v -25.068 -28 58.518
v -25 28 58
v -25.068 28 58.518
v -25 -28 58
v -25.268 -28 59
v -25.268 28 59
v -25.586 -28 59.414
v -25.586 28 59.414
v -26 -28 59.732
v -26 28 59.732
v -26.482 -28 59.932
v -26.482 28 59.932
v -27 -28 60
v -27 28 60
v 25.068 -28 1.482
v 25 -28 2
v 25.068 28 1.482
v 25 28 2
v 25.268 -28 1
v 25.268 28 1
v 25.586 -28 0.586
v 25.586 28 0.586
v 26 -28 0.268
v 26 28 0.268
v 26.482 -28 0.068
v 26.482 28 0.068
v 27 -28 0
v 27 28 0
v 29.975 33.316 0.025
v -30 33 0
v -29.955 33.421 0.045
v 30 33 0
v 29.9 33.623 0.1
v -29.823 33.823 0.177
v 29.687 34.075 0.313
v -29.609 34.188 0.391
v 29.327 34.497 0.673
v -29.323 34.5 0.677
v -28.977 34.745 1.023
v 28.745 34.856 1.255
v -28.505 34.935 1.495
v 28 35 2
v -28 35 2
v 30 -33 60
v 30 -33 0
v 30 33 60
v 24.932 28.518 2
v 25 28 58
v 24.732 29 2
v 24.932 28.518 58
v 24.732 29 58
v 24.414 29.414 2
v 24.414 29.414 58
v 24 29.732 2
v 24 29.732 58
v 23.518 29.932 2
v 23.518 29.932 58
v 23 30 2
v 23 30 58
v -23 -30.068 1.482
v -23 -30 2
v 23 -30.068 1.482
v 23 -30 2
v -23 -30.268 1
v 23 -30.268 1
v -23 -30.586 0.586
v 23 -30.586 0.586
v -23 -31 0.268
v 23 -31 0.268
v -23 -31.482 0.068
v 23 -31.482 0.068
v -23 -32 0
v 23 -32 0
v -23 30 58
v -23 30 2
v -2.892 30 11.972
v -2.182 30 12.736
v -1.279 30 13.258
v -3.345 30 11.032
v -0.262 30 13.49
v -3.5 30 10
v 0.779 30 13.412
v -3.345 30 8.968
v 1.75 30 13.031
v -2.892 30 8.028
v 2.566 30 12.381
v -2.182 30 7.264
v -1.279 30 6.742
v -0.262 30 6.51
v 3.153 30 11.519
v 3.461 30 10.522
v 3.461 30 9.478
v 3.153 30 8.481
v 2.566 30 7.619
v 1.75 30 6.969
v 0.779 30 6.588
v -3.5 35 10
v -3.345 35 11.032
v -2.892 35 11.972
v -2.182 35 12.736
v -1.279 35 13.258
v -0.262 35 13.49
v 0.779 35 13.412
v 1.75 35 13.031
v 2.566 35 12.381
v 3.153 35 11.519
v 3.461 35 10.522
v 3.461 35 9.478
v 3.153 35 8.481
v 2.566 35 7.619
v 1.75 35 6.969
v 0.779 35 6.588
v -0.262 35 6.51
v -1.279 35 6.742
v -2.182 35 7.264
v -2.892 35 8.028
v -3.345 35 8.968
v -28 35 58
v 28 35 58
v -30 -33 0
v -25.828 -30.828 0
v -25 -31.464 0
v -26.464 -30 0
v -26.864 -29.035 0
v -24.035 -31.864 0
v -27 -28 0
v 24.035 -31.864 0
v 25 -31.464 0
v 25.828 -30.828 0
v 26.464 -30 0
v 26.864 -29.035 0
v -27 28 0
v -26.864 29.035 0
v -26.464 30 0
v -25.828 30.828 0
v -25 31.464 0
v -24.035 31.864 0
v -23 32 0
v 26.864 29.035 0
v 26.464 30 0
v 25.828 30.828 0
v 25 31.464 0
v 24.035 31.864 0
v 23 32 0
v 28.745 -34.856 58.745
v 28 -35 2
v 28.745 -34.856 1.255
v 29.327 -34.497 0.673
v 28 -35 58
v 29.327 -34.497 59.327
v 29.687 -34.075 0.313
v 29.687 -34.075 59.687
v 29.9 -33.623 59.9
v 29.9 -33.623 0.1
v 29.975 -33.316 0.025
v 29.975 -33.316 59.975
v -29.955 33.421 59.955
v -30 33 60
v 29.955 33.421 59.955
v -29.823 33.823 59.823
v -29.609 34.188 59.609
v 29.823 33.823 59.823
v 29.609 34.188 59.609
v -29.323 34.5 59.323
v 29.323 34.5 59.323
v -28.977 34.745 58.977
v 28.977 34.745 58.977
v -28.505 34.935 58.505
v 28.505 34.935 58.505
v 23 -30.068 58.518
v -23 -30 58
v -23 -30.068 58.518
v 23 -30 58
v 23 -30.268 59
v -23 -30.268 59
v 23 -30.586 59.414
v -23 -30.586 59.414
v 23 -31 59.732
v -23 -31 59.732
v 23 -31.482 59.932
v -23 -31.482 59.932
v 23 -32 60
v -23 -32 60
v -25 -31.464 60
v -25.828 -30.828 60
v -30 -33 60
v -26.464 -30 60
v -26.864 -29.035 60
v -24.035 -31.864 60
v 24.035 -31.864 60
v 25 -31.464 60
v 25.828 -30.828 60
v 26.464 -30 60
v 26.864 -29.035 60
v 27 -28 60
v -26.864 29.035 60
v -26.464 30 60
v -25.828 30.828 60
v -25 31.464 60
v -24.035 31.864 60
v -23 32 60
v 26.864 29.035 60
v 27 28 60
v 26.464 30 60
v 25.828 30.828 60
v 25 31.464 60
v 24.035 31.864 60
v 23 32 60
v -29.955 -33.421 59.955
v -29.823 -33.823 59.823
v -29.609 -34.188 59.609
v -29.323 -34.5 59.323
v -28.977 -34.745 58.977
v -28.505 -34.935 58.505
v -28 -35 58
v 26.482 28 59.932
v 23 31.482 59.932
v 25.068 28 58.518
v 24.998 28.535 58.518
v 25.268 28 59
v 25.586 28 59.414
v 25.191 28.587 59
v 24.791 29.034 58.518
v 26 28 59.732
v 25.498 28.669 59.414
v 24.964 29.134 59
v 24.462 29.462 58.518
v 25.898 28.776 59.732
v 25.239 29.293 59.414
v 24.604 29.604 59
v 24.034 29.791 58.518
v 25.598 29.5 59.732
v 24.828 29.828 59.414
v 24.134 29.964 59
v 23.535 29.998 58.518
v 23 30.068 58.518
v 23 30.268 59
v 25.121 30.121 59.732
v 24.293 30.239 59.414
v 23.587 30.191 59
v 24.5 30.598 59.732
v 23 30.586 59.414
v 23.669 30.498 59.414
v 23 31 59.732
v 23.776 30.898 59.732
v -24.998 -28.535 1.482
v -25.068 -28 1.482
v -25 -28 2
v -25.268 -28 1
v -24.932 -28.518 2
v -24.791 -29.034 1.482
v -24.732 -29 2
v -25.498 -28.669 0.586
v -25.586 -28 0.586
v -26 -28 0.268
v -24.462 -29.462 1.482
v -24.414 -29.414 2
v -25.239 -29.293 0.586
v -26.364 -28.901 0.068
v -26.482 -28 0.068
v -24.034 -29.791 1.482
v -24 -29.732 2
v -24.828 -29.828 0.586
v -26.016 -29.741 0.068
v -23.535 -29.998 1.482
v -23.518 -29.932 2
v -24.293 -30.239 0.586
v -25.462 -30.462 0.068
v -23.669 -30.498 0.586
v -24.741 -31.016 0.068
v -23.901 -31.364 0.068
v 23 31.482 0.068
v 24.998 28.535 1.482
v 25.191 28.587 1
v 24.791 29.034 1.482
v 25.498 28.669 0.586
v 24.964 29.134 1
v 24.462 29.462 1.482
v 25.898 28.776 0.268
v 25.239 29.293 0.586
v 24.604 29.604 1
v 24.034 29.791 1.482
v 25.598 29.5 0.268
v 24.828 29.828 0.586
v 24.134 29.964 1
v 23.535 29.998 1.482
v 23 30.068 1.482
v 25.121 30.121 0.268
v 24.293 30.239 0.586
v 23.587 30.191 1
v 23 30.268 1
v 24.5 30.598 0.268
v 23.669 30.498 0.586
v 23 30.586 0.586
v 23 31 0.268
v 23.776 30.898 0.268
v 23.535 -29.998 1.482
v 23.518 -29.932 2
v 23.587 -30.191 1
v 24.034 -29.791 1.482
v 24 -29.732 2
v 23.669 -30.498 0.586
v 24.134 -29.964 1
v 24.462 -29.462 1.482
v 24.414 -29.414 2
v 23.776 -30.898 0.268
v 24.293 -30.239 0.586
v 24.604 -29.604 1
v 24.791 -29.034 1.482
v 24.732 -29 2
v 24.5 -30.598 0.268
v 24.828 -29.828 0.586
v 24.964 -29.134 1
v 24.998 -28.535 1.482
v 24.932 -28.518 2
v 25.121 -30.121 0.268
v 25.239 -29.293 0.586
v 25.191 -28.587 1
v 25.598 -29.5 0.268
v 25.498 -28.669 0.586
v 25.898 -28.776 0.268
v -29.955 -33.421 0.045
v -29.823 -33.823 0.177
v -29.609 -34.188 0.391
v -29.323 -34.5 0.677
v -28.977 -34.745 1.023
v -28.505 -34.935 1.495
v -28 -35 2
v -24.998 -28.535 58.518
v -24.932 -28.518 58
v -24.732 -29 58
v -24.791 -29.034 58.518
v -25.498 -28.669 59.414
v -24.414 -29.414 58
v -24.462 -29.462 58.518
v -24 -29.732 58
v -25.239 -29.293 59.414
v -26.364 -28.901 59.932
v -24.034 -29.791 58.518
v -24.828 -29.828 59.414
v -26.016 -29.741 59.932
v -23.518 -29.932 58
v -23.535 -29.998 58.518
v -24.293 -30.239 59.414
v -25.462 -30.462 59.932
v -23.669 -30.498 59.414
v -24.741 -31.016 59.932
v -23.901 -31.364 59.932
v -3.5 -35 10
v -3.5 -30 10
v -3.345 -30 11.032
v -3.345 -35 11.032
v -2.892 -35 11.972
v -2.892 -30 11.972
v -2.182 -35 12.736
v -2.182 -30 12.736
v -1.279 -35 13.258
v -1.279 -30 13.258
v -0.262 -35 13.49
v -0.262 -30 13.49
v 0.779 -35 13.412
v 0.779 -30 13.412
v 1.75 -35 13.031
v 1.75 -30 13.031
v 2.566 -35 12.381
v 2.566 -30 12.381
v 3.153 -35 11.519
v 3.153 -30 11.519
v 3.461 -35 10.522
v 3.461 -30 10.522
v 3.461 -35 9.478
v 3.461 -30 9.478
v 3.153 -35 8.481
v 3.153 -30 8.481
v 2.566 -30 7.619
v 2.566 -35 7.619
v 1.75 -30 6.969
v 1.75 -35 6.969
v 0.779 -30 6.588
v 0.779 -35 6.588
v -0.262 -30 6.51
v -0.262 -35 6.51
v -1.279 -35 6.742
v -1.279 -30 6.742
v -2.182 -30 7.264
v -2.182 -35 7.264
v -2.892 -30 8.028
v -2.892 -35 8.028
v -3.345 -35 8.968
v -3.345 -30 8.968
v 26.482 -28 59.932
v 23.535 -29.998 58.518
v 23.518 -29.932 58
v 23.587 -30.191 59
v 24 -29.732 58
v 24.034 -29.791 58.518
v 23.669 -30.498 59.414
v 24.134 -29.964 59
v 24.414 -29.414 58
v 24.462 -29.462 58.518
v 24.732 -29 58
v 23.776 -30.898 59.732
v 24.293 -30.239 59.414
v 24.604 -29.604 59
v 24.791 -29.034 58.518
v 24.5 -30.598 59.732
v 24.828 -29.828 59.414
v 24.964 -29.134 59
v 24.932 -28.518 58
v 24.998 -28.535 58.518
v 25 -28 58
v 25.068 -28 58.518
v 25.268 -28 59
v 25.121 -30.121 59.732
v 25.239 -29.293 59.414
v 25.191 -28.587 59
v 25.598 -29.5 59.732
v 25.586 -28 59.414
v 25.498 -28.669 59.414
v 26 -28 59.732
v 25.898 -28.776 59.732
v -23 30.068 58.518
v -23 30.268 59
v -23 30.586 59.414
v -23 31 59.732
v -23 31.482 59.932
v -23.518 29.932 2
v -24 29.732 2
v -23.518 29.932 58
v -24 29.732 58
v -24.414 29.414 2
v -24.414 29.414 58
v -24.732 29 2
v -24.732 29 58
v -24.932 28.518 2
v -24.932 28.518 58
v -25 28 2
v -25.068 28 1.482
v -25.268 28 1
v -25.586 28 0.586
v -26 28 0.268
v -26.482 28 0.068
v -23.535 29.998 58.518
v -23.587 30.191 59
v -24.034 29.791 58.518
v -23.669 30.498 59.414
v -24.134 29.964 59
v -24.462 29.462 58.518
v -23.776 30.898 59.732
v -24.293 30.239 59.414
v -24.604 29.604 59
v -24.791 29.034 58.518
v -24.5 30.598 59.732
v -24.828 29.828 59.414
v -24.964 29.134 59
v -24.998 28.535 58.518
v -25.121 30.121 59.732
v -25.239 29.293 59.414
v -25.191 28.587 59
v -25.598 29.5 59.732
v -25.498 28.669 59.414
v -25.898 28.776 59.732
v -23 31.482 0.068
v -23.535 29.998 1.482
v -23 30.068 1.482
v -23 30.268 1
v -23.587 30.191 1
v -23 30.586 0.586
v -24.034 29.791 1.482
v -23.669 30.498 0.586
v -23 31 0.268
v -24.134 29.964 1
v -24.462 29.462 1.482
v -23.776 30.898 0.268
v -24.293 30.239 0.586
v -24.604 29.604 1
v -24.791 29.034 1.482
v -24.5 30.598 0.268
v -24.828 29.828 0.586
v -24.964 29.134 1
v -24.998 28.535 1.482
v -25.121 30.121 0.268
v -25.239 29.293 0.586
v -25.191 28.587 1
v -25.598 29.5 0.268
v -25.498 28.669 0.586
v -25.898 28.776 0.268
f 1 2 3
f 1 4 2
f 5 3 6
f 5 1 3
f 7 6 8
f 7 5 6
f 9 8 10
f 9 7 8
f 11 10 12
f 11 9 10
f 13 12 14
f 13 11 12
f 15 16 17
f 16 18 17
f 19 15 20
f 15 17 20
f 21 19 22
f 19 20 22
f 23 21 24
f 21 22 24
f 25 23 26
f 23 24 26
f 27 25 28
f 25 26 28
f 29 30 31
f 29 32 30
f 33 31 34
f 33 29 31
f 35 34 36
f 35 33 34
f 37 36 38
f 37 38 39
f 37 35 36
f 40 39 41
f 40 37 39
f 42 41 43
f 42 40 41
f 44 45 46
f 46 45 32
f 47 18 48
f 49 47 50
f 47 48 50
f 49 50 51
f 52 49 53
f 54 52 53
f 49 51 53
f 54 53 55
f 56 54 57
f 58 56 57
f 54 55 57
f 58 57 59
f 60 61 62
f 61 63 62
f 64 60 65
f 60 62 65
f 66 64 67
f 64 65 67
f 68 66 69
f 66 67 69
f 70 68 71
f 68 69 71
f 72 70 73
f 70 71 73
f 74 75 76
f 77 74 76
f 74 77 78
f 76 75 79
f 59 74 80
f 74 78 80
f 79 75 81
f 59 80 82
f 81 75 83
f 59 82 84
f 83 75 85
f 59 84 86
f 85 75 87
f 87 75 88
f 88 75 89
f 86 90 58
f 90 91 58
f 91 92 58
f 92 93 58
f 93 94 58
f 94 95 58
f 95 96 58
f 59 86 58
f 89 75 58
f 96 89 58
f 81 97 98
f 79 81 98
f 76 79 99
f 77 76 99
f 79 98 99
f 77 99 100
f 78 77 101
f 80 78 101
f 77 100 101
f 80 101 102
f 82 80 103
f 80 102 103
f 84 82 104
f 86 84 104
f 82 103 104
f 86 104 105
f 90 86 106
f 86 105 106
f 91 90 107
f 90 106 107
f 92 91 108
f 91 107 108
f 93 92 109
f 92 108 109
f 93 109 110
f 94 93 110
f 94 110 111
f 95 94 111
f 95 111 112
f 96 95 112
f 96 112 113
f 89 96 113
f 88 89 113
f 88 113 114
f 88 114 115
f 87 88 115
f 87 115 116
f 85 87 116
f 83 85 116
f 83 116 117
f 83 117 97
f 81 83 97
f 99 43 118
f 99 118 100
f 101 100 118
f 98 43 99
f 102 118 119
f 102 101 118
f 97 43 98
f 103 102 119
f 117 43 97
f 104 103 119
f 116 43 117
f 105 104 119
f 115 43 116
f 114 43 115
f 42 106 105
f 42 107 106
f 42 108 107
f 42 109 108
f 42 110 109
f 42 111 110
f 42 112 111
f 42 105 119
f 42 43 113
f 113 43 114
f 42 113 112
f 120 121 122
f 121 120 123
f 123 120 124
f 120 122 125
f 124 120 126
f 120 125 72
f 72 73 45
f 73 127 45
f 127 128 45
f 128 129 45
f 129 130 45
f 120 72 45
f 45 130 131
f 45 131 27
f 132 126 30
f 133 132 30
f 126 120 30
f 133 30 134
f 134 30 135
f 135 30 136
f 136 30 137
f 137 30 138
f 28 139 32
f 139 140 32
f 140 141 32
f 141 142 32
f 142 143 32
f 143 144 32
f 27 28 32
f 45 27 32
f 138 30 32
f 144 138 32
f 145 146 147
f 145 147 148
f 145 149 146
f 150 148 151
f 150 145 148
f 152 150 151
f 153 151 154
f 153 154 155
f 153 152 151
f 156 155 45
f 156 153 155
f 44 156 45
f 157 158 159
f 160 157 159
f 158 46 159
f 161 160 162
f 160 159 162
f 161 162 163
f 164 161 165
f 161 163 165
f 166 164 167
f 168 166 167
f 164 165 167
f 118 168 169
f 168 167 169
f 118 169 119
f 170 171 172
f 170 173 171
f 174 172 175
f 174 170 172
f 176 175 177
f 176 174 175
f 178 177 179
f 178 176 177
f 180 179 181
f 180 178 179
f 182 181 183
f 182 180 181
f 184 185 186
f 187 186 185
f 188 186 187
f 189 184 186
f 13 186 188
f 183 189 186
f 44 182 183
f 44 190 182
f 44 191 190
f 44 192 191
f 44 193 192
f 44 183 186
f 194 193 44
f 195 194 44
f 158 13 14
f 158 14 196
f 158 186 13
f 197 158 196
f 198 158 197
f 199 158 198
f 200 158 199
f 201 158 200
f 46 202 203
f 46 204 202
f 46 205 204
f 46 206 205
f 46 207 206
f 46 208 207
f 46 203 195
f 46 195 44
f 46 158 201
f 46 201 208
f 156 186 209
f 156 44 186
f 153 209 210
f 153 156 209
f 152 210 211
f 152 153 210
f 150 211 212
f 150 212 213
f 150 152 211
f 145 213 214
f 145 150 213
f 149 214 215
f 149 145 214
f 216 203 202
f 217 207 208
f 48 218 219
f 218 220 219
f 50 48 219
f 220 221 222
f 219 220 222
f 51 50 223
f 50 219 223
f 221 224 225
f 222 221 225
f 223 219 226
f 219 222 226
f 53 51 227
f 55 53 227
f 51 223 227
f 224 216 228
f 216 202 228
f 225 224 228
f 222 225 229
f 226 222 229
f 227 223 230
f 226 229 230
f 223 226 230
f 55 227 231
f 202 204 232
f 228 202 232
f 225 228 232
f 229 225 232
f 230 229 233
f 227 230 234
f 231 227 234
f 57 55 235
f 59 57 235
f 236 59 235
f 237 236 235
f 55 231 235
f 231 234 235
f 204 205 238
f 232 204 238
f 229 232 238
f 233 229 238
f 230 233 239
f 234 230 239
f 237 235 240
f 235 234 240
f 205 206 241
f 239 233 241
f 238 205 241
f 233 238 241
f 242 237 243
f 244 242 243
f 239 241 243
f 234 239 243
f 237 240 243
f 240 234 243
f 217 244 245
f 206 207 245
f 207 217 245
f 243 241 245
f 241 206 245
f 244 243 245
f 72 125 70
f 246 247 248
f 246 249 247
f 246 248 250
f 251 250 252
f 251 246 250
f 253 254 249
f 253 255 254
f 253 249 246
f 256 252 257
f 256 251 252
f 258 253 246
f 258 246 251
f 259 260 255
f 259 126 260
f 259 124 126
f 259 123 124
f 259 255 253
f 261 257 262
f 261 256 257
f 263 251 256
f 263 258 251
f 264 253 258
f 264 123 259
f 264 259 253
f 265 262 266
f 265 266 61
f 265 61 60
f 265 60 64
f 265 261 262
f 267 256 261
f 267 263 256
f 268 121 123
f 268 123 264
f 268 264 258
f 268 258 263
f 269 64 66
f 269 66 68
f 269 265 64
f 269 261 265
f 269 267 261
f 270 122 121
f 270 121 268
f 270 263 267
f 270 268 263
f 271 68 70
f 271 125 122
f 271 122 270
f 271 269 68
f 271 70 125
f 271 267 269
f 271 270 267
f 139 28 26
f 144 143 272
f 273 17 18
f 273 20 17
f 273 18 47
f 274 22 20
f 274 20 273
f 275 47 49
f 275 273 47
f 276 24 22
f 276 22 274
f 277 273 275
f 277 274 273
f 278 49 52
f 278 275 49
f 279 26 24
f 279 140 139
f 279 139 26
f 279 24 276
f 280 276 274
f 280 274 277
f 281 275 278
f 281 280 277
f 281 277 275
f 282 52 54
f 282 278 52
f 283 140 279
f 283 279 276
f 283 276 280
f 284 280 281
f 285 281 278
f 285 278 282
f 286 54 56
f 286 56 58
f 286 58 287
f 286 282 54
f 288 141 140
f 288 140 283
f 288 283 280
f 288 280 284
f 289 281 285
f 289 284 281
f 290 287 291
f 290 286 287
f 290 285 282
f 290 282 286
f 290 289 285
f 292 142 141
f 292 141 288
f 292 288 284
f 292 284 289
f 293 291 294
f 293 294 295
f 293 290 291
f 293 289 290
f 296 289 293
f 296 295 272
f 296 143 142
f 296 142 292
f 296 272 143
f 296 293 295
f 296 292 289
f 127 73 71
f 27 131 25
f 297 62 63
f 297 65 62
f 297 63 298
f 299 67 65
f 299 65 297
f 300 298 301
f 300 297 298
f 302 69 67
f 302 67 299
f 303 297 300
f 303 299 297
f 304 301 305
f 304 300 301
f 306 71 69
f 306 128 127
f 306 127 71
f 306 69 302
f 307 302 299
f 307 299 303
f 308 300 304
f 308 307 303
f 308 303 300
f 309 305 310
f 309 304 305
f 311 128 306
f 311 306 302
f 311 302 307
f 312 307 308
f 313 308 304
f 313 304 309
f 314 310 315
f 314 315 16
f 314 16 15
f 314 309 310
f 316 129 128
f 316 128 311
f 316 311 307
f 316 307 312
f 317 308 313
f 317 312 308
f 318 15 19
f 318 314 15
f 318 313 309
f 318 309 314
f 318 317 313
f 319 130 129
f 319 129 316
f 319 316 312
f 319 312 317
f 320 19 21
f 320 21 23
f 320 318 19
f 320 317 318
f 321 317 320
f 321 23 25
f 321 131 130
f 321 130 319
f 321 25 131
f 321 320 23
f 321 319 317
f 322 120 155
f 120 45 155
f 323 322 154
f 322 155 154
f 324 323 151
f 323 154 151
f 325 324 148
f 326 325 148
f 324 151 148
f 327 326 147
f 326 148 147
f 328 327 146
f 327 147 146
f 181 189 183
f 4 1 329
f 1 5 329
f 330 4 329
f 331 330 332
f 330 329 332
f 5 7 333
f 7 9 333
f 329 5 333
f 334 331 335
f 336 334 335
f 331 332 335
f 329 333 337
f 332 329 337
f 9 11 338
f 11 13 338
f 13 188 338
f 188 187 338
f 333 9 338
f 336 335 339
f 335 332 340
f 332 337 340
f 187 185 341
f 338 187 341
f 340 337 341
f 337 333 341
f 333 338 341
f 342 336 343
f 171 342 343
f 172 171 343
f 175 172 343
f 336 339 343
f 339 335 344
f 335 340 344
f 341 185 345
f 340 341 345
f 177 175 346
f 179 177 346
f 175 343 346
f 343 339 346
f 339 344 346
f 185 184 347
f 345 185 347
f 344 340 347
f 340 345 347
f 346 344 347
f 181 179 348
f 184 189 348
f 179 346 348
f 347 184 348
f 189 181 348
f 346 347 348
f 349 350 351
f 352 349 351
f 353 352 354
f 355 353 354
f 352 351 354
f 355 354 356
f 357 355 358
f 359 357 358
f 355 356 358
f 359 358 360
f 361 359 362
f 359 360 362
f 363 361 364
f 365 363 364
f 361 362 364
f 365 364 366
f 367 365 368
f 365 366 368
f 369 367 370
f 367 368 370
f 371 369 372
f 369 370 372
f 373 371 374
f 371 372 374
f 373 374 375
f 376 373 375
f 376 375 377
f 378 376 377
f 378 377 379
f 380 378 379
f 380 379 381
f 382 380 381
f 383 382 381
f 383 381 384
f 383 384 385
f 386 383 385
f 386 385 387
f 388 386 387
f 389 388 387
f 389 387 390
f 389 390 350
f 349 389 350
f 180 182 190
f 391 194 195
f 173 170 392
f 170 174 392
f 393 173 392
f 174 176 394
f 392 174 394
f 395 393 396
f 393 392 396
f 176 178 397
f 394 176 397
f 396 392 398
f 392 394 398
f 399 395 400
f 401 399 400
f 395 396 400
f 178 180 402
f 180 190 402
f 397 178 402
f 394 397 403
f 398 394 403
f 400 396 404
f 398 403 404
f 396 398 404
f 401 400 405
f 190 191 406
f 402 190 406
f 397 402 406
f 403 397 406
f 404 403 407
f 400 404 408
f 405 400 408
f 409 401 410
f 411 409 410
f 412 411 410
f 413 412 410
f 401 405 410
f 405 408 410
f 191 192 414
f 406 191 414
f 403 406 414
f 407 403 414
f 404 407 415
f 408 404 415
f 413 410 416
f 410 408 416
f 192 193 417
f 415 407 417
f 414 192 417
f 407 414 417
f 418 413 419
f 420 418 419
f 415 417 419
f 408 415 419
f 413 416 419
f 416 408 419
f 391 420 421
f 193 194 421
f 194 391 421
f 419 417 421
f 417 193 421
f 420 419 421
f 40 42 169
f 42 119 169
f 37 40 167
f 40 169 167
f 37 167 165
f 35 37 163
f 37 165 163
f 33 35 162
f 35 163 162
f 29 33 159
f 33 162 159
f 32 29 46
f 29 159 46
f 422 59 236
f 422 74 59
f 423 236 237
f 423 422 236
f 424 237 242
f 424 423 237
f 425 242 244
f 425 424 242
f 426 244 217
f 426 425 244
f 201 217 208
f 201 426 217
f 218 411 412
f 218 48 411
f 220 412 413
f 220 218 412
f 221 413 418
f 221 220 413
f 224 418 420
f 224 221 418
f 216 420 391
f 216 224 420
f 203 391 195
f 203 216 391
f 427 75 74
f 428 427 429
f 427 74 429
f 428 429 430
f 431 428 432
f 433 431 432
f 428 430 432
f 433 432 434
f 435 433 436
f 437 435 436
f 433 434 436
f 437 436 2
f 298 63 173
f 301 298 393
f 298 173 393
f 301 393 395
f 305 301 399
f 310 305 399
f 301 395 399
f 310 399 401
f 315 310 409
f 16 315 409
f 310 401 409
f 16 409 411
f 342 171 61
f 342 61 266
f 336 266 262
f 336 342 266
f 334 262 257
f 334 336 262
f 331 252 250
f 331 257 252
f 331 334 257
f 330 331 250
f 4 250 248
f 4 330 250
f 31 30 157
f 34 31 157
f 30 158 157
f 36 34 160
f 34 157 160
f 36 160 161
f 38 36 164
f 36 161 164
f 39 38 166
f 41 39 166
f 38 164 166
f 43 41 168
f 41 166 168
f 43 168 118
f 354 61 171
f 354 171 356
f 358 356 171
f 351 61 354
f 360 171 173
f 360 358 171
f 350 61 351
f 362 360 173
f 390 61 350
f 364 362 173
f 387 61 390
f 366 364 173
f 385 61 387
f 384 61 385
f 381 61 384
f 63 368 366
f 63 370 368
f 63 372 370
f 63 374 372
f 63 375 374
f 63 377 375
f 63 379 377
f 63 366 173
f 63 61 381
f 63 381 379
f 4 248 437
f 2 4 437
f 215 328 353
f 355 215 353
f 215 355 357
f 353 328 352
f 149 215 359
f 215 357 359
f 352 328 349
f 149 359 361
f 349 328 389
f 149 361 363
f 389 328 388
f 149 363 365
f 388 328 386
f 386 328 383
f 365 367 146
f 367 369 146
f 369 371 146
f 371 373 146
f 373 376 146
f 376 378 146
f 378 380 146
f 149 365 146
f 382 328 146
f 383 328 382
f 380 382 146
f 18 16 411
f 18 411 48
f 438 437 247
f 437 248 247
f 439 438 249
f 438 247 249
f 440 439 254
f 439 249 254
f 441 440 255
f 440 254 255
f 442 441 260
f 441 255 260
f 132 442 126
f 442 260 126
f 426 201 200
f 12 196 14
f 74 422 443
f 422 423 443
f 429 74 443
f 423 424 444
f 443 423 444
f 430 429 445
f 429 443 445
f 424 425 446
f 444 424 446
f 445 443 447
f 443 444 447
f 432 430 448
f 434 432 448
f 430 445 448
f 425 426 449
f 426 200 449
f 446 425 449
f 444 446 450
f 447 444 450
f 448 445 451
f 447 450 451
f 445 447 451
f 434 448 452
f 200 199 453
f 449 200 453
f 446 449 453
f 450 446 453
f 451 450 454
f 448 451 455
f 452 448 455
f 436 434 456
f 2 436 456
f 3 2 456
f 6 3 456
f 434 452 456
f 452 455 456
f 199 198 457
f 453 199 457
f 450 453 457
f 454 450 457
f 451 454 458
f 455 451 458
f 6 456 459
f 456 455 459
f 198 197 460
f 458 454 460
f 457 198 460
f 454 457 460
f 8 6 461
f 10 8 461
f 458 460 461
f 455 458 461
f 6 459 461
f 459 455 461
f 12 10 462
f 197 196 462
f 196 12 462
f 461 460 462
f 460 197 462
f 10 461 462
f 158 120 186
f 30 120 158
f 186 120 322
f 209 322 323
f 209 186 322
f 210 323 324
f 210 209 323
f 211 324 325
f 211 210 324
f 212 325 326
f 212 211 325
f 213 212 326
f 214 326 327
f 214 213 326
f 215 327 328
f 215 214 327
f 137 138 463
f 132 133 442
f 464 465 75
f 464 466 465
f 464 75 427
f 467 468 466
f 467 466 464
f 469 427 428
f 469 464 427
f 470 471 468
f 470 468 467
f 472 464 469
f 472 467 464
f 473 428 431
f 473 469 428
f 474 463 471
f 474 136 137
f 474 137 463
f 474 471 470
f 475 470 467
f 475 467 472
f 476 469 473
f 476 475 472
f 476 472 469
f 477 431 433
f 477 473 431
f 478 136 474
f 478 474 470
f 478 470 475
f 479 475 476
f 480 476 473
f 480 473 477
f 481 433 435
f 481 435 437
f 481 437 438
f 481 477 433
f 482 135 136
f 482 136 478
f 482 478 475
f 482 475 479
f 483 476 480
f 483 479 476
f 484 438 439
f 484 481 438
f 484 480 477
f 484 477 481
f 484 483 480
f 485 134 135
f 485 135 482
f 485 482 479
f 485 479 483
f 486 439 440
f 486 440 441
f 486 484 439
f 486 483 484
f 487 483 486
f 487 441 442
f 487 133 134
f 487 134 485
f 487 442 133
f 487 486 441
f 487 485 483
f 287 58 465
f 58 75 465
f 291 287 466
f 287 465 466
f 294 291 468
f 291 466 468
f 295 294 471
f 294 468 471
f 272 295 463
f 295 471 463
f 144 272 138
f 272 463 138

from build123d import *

# Parameters (mm, degrees)
F0_W     = 60
F0_H     = 70
F0_W_2   = 50
F0_H_2   = 60
F1_DEPTH = 60
F2_F1_R  = 2
F2_F2_R  = 2
F4_R     = 3.5
F5_DEPTH = 70


with BuildPart() as f1:
    # F0 (on Top) → F1 (new body)
    with BuildSketch(Plane.XY):
        Rectangle(F0_W, F0_H)
        Rectangle(F0_W_2, F0_H_2, mode=Mode.SUBTRACT)
    extrude(amount=F1_DEPTH)

    # F2: fillet of radius 2 on 16 edges, made by hand

    # F2_f1
    f2_f1_edges = [f1.edges().sort_by_distance(p)[0] for p in [
        (-25, -30, 30),
        (25, -30, 30),
        (25, 30, 30),
        (-25, 30, 30),
    ]]
    fillet(f2_f1_edges, radius=F2_F1_R)

    # F2_f2
    f2_f2_edges = [f1.edges().sort_by_distance(p)[0] for p in [
        (-30, 35, 30),
        (0, 35, 60),
        (30, 35, 30),
        (0, 35, 0),
        (30, -35, 30),
        (0, -35, 60),
        (-30, -35, 30),
        (0, -35, 0),
        (0, -30, 60),
        (0, -30, 0),
        (0, 30, 60),
        (0, 30, 0),
        (-24.4142135624, 29.4142135624, 0),
        (24.4142135624, 29.4142135624, 0),
        (-24.4142135624, 29.4142135624, 60),
        (24.4142135624, 29.4142135624, 60),
        (24.4142135624, -29.4142135624, 0),
        (-24.4142135624, -29.4142135624, 0),
        (24.4142135624, -29.4142135624, 60),
        (-24.4142135624, -29.4142135624, 60),
    ]]
    fillet(f2_f2_edges, radius=F2_F2_R)

    # F4 (on face) → F5 (cut)
    with BuildSketch(Plane(origin=(0, 35, 0), x_dir=(-1, 0, 0), z_dir=(0, 1, 0))):
        with Locations((0, 10)):
            Circle(F4_R)
    extrude(amount=-F5_DEPTH, mode=Mode.SUBTRACT)


solid = f1.part
